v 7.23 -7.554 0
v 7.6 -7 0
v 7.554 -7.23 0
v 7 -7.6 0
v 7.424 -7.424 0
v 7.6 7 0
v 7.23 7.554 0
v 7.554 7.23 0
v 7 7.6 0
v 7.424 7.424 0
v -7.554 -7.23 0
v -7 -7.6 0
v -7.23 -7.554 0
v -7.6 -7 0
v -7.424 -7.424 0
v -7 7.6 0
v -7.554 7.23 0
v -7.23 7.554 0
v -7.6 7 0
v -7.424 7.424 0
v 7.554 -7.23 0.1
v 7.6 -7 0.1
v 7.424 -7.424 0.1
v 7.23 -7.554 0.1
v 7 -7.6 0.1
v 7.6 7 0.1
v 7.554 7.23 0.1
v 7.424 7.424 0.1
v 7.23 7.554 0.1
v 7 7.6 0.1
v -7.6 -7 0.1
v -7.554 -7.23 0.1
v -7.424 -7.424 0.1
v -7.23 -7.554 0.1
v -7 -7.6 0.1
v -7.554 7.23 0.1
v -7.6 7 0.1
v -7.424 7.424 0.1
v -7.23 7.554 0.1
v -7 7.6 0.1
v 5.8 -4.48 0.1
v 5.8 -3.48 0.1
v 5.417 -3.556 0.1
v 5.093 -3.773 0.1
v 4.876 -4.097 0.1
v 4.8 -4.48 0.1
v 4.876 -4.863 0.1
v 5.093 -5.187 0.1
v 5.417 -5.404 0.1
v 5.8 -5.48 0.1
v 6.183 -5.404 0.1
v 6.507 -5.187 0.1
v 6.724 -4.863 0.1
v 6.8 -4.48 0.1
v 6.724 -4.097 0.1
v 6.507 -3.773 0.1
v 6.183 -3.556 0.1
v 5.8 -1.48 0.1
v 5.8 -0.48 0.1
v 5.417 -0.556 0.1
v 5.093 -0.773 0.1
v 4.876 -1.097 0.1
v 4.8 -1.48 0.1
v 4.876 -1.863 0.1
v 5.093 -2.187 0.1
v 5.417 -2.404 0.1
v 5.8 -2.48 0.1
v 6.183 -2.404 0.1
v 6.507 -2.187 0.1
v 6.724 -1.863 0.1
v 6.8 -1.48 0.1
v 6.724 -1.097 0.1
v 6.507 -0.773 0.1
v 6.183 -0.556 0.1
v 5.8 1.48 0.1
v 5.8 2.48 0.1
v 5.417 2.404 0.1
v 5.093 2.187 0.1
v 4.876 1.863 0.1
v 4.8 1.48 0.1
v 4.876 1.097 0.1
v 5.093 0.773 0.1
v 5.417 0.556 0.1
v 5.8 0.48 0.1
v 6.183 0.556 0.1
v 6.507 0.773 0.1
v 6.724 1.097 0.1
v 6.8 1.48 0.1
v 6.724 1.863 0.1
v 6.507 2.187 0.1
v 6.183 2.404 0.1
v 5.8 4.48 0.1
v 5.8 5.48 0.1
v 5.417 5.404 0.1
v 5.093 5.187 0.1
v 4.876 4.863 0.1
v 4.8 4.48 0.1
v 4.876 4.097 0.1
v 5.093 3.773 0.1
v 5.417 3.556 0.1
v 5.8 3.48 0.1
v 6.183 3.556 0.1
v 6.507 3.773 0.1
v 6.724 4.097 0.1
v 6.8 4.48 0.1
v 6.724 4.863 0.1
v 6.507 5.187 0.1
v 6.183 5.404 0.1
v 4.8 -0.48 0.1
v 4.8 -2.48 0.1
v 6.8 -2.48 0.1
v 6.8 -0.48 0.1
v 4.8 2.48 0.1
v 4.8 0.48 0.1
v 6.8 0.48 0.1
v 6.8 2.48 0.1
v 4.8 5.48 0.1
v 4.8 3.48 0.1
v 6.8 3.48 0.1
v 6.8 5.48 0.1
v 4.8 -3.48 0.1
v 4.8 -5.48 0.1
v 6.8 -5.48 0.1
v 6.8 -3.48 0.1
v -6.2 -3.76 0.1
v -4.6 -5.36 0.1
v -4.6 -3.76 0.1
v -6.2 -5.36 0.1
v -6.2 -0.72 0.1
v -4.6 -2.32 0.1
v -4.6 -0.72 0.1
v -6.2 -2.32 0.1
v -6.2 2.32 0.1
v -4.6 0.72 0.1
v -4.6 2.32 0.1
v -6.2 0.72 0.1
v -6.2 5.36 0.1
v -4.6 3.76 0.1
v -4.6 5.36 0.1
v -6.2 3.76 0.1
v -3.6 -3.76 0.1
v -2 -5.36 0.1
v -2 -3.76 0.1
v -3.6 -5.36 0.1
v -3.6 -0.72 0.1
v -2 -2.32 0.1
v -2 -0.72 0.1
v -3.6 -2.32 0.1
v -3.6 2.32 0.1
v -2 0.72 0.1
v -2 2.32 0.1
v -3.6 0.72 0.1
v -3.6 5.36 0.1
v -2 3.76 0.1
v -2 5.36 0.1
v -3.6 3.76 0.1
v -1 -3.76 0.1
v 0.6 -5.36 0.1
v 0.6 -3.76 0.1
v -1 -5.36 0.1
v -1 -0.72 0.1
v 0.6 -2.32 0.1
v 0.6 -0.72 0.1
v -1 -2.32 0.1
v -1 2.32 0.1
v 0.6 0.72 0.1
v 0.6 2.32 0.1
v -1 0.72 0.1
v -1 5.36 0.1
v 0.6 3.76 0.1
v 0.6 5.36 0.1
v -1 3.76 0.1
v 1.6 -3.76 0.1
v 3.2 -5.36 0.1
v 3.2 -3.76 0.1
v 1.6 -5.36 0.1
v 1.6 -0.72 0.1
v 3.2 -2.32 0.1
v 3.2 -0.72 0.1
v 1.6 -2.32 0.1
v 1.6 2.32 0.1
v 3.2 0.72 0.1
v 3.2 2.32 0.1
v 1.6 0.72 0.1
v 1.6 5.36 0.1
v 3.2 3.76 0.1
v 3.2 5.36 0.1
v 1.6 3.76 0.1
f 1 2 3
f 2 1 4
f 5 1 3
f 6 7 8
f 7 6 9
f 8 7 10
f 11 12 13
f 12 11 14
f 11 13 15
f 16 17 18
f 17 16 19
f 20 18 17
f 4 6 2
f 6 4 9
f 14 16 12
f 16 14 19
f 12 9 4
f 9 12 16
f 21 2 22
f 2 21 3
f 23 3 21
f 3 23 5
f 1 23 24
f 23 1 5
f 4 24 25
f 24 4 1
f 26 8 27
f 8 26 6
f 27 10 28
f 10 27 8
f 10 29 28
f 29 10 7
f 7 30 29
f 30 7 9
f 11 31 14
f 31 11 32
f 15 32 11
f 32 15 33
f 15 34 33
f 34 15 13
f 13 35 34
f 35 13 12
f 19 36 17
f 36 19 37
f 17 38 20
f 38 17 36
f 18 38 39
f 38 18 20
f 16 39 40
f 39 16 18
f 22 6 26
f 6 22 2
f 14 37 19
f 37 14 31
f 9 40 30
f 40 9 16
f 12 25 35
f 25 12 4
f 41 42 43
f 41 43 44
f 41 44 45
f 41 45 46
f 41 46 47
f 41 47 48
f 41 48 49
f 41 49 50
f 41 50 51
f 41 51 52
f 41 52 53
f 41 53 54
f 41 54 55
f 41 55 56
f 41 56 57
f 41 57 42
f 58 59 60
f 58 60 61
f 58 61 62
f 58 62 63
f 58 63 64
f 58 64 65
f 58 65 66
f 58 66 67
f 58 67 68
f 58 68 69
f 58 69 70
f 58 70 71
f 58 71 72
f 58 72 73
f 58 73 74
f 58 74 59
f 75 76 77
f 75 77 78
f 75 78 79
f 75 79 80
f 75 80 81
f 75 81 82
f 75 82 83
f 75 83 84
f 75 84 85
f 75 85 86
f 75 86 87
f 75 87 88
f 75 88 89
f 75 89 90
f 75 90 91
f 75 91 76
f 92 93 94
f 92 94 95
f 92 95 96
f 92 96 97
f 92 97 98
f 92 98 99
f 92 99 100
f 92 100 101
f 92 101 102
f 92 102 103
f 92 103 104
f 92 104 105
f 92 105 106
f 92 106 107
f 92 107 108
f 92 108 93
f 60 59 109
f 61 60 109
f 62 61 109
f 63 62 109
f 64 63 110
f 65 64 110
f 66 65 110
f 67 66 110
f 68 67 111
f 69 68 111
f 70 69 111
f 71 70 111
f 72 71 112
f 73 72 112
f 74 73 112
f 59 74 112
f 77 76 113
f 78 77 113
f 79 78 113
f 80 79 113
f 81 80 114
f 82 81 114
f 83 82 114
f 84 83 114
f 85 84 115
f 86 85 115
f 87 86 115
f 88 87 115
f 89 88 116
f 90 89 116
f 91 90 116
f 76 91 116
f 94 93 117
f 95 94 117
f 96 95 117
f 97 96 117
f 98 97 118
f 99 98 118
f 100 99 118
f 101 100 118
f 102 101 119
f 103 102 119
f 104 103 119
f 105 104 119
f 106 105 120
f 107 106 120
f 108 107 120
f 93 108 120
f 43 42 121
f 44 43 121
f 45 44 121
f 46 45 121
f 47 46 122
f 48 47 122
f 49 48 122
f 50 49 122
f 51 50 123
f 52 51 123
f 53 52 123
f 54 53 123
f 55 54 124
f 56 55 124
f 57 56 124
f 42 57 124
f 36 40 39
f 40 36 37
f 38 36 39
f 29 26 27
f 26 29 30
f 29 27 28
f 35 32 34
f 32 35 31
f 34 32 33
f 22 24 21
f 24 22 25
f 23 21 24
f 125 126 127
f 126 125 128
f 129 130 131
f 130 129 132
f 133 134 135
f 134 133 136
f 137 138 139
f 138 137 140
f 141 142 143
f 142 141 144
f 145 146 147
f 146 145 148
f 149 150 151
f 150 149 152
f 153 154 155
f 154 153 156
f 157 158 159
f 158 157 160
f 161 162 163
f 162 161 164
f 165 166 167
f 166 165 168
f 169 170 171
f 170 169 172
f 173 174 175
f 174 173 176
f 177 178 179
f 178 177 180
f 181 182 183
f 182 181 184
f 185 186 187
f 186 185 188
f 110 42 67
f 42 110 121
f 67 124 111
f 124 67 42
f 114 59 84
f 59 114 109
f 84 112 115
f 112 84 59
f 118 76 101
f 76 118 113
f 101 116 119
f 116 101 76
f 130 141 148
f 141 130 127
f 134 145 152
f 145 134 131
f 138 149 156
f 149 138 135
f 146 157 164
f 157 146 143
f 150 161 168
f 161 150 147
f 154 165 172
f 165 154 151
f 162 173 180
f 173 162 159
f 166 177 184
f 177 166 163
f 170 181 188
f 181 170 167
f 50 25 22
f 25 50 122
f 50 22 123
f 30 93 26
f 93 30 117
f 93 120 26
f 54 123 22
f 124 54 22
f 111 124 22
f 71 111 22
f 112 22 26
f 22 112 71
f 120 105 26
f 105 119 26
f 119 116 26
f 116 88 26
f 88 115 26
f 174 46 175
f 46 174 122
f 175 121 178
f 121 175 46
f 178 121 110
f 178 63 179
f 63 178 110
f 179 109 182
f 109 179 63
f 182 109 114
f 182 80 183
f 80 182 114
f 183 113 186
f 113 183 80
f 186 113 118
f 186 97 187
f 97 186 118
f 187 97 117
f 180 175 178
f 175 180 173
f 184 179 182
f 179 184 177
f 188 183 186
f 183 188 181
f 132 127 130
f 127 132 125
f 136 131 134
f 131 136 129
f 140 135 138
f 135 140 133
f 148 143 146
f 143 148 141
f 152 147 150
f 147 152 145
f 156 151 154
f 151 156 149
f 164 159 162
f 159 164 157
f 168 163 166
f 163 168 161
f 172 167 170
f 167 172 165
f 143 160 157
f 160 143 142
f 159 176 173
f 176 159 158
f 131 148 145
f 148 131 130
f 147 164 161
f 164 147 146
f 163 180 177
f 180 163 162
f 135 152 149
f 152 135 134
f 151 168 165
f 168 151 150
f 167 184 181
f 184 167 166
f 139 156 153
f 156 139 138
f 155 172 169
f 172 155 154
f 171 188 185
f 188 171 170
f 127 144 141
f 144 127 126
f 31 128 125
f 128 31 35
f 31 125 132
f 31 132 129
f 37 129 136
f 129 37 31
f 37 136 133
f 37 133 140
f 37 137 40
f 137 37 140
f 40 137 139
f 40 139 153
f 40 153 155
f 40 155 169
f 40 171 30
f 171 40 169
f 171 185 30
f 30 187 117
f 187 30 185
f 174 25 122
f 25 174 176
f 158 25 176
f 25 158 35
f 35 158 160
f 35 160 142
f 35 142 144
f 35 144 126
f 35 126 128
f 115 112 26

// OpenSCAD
// file: ../p/4-4ndis.scad
use <../lib.scad>
function ldraw_lib__4_4ndis() = [
// 0 Disc Negative 1.0
// 0 Name: 4-4ndis.dat
// 0 Author: James Jessiman
// 0 !LDRAW_ORG Primitive UPDATE 2012-01
// 0 !LICENSE Licensed under CC BY 4.0 : see CAreadme.txt
// 
// 0 BFC CERTIFY CCW
  [0,"BFC","CERTIFY"],
  [0,"BFC","CCW"],
// 
// 0 !HISTORY 2002-03-23 [sbliss] Added BFC statement; compacted code
// 0 !HISTORY 2002-04-25 [PTadmin] Official Update 2002-02
// 0 !HISTORY 2007-06-24 [PTadmin] Header formatted for Contributor Agreement
// 0 !HISTORY 2008-07-01 [PTadmin] Official Update 2008-01
// 0 !HISTORY 2012-02-16 [Philo] Changed to CCW
// 0 !HISTORY 2012-03-30 [PTadmin] Official Update 2012-01
// 
// 
// 3 16 0.9239 0 0.3827 1 0 0 1 0 1
  [3,16,0.9239,0,0.3827,1,0,0,1,0,1],
// 3 16 0.7071 0 0.7071 0.9239 0 0.3827 1 0 1
  [3,16,0.7071,0,0.7071,0.9239,0,0.3827,1,0,1],
// 3 16 0.3827 0 0.9239 0.7071 0 0.7071 1 0 1
  [3,16,0.3827,0,0.9239,0.7071,0,0.7071,1,0,1],
// 3 16 0 0 1 0.3827 0 0.9239 1 0 1
  [3,16,0,0,1,0.3827,0,0.9239,1,0,1],
// 3 16 -0.3827 0 0.9239 0 0 1 -1 0 1
  [3,16,-0.3827,0,0.9239,0,0,1,-1,0,1],
// 3 16 -0.7071 0 0.7071 -0.3827 0 0.9239 -1 0 1
  [3,16,-0.7071,0,0.7071,-0.3827,0,0.9239,-1,0,1],
// 3 16 -0.9239 0 0.3827 -0.7071 0 0.7071 -1 0 1
  [3,16,-0.9239,0,0.3827,-0.7071,0,0.7071,-1,0,1],
// 3 16 -1 0 0 -0.9239 0 0.3827 -1 0 1
  [3,16,-1,0,0,-0.9239,0,0.3827,-1,0,1],
// 3 16 -0.9239 0 -0.3827 -1 0 0 -1 0 -1
  [3,16,-0.9239,0,-0.3827,-1,0,0,-1,0,-1],
// 3 16 -0.7071 0 -0.7071 -0.9239 0 -0.3827 -1 0 -1
  [3,16,-0.7071,0,-0.7071,-0.9239,0,-0.3827,-1,0,-1],
// 3 16 -0.3827 0 -0.9239 -0.7071 0 -0.7071 -1 0 -1
  [3,16,-0.3827,0,-0.9239,-0.7071,0,-0.7071,-1,0,-1],
// 3 16 0 0 -1 -0.3827 0 -0.9239 -1 0 -1
  [3,16,0,0,-1,-0.3827,0,-0.9239,-1,0,-1],
// 3 16 0.3827 0 -0.9239 0 0 -1 1 0 -1
  [3,16,0.3827,0,-0.9239,0,0,-1,1,0,-1],
// 3 16 0.7071 0 -0.7071 0.3827 0 -0.9239 1 0 -1
  [3,16,0.7071,0,-0.7071,0.3827,0,-0.9239,1,0,-1],
// 3 16 0.9239 0 -0.3827 0.7071 0 -0.7071 1 0 -1
  [3,16,0.9239,0,-0.3827,0.7071,0,-0.7071,1,0,-1],
// 3 16 1 0 0 0.9239 0 -0.3827 1 0 -1
  [3,16,1,0,0,0.9239,0,-0.3827,1,0,-1],
];
module ldraw_lib__4_4ndis(step=0, col=false, unit=2/5, alt=false, line=0.2, solid=!$preview)
    makepoly(ldraw_lib__4_4ndis(), step=step, col=col, unit=unit, alt=alt, line=line, solid=solid);
ldraw_lib__4_4ndis(line=0.2);
// file: ../p/4-4disc.scad
use <../lib.scad>
function ldraw_lib__4_4disc() = [
// 0 Disc 1.0
// 0 Name: 4-4disc.dat
// 0 Author: James Jessiman
// 0 !LDRAW_ORG Primitive UPDATE 2002-02
// 0 !LICENSE Licensed under CC BY 4.0 : see CAreadme.txt
// 
// 0 BFC CERTIFY CCW
  [0,"BFC","CERTIFY"],
  [0,"BFC","CCW"],
// 
// 0 !HISTORY 1998-12-15 [PTadmin] Official Update 1998-10
// 0 !HISTORY 2002-03-23 [sbliss] Added BFC statement
// 0 !HISTORY 2002-04-25 [PTadmin] Official Update 2002-02
// 0 !HISTORY 2007-06-24 [PTadmin] Header formatted for Contributor Agreement
// 0 !HISTORY 2008-07-01 [PTadmin] Official Update 2008-01
// 
// 
// 3 16 0 0 0 1 0 0 0.9239 0 0.3827
  [3,16,0,0,0,1,0,0,0.9239,0,0.3827],
// 3 16 0 0 0 0.9239 0 0.3827 0.7071 0 0.7071
  [3,16,0,0,0,0.9239,0,0.3827,0.7071,0,0.7071],
// 3 16 0 0 0 0.7071 0 0.7071 0.3827 0 0.9239
  [3,16,0,0,0,0.7071,0,0.7071,0.3827,0,0.9239],
// 3 16 0 0 0 0.3827 0 0.9239 0 0 1
  [3,16,0,0,0,0.3827,0,0.9239,0,0,1],
// 3 16 0 0 0 0 0 1 -0.3827 0 0.9239
  [3,16,0,0,0,0,0,1,-0.3827,0,0.9239],
// 3 16 0 0 0 -0.3827 0 0.9239 -0.7071 0 0.7071
  [3,16,0,0,0,-0.3827,0,0.9239,-0.7071,0,0.7071],
// 3 16 0 0 0 -0.7071 0 0.7071 -0.9239 0 0.3827
  [3,16,0,0,0,-0.7071,0,0.7071,-0.9239,0,0.3827],
// 3 16 0 0 0 -0.9239 0 0.3827 -1 0 -0
  [3,16,0,0,0,-0.9239,0,0.3827,-1,0,-0],
// 3 16 0 0 0 -1 0 -0 -0.9239 0 -0.3827
  [3,16,0,0,0,-1,0,-0,-0.9239,0,-0.3827],
// 3 16 0 0 0 -0.9239 0 -0.3827 -0.7071 0 -0.7071
  [3,16,0,0,0,-0.9239,0,-0.3827,-0.7071,0,-0.7071],
// 3 16 0 0 0 -0.7071 0 -0.7071 -0.3827 0 -0.9239
  [3,16,0,0,0,-0.7071,0,-0.7071,-0.3827,0,-0.9239],
// 3 16 0 0 0 -0.3827 0 -0.9239 0 0 -1
  [3,16,0,0,0,-0.3827,0,-0.9239,0,0,-1],
// 3 16 0 0 0 0 0 -1 0.3827 0 -0.9239
  [3,16,0,0,0,0,0,-1,0.3827,0,-0.9239],
// 3 16 0 0 0 0.3827 0 -0.9239 0.7071 0 -0.7071
  [3,16,0,0,0,0.3827,0,-0.9239,0.7071,0,-0.7071],
// 3 16 0 0 0 0.7071 0 -0.7071 0.9239 0 -0.3827
  [3,16,0,0,0,0.7071,0,-0.7071,0.9239,0,-0.3827],
// 3 16 0 0 0 0.9239 0 -0.3827 1 0 0
  [3,16,0,0,0,0.9239,0,-0.3827,1,0,0],
// 0
];
module ldraw_lib__4_4disc(step=0, col=false, unit=2/5, alt=false, line=0.2, solid=!$preview)
    makepoly(ldraw_lib__4_4disc(), step=step, col=col, unit=unit, alt=alt, line=line, solid=solid);
ldraw_lib__4_4disc(line=0.2);
// file: ../p/1-4cyli.scad
use <../lib.scad>
function ldraw_lib__1_4cyli() = [
// 0 Cylinder 0.25
// 0 Name: 1-4cyli.dat
// 0 Author: James Jessiman
// 0 !LDRAW_ORG Primitive UPDATE 2012-01
// 0 !LICENSE Licensed under CC BY 4.0 : see CAreadme.txt
// 
// 0 BFC CERTIFY CCW
  [0,"BFC","CERTIFY"],
  [0,"BFC","CCW"],
// 
// 0 !HISTORY 2002-03-23 [sbliss] Added BFC statement.
// 0 !HISTORY 2002-04-25 [PTadmin] Official Update 2002-02
// 0 !HISTORY 2007-06-22 [PTadmin] Header formatted for Contributor Agreement
// 0 !HISTORY 2008-07-01 [PTadmin] Official Update 2008-01
// 0 !HISTORY 2012-02-16 [Philo] Changed to CCW
// 0 !HISTORY 2012-03-30 [PTadmin] Official Update 2012-01
// 
// 
// 4 16 1 1 0 0.9239 1 0.3827 0.9239 0 0.3827 1 0 0
  [4,16,1,1,0,0.9239,1,0.3827,0.9239,0,0.3827,1,0,0],
// 5 24 1 0 0 1 1 0 0.9239 0 0.3827 1 0 -1
  [5,24,1,0,0,1,1,0,0.9239,0,0.3827,1,0,-1],
// 4 16 0.9239 1 0.3827 0.7071 1 0.7071 0.7071 0 0.7071 0.9239 0 0.3827
  [4,16,0.9239,1,0.3827,0.7071,1,0.7071,0.7071,0,0.7071,0.9239,0,0.3827],
// 5 24 0.9239 0 0.3827 0.9239 1 0.3827 0.7071 0 0.7071 1 0 0
  [5,24,0.9239,0,0.3827,0.9239,1,0.3827,0.7071,0,0.7071,1,0,0],
// 4 16 0.7071 1 0.7071 0.3827 1 0.9239 0.3827 0 0.9239 0.7071 0 0.7071
  [4,16,0.7071,1,0.7071,0.3827,1,0.9239,0.3827,0,0.9239,0.7071,0,0.7071],
// 5 24 0.7071 0 0.7071 0.7071 1 0.7071 0.3827 0 0.9239 0.9239 0 0.3827
  [5,24,0.7071,0,0.7071,0.7071,1,0.7071,0.3827,0,0.9239,0.9239,0,0.3827],
// 4 16 0.3827 1 0.9239 0 1 1 0 0 1 0.3827 0 0.9239
  [4,16,0.3827,1,0.9239,0,1,1,0,0,1,0.3827,0,0.9239],
// 5 24 0.3827 0 0.9239 0.3827 1 0.9239 0 0 1 0.7071 0 0.7071
  [5,24,0.3827,0,0.9239,0.3827,1,0.9239,0,0,1,0.7071,0,0.7071],
// 5 24 0 0 1 0 1 1 0.3827 0 0.9239 -1 0 1
  [5,24,0,0,1,0,1,1,0.3827,0,0.9239,-1,0,1],
];
module ldraw_lib__1_4cyli(step=0, col=false, unit=2/5, alt=false, line=0.2, solid=!$preview)
    makepoly(ldraw_lib__1_4cyli(), step=step, col=col, unit=unit, alt=alt, line=line, solid=solid);
ldraw_lib__1_4cyli(line=0.2);
// file: ../p/1-4chrd.scad
use <../lib.scad>
function ldraw_lib__1_4chrd() = [
// 0 Chord 0.25
// 0 Name: 1-4chrd.dat
// 0 Author: Max Martin Richter [MMR1988]
// 0 !LDRAW_ORG Primitive UPDATE 2023-05
// 0 !LICENSE Licensed under CC BY 4.0 : see CAreadme.txt
// 
// 0 BFC CERTIFY CCW
  [0,"BFC","CERTIFY"],
  [0,"BFC","CCW"],
// 
// 0 !HISTORY 2004-04-22 [PTadmin] Official Update 2004-02
// 0 !HISTORY 2007-10-09 [PTadmin] Header formatted for Contributor Agreement
// 0 !HISTORY 2008-07-01 [PTadmin] Official Update 2008-01
// 0 !HISTORY 2012-08-02 [MMR1988] Re-creation with PrimGen2 and Rectifier
// 0 !HISTORY 2012-08-09 [PTadmin] Official Update 2012-02
// 0 !HISTORY 2023-10-27 [OrionP] Change author to MMR1988 from hafhead
// 0 !HISTORY 2023-10-31 [OrionP] Official Update 2023-05
// 
// 4 16 0.9239 0 0.3827 0.3827 0 0.9239 0 0 1 1 0 0
  [4,16,0.9239,0,0.3827,0.3827,0,0.9239,0,0,1,1,0,0],
// 3 16 0.7071 0 0.7071 0.3827 0 0.9239 0.9239 0 0.3827
  [3,16,0.7071,0,0.7071,0.3827,0,0.9239,0.9239,0,0.3827],
];
module ldraw_lib__1_4chrd(step=0, col=false, unit=2/5, alt=false, line=0.2, solid=!$preview)
    makepoly(ldraw_lib__1_4chrd(), step=step, col=col, unit=unit, alt=alt, line=line, solid=solid);
ldraw_lib__1_4chrd(line=0.2);
// main file
use <../lib.scad>
use <../p/1-4chrd.scad>
use <../p/1-4cyli.scad>
use <../p/4-4disc.scad>
use <../p/4-4ndis.scad>
function ldraw_lib__6429457f() = [
// 0 Sticker  1.9 x  1.9 with Red Circles and Black Rectangles on Yellow Background
// 0 Name: 6429457f.dat
// 0 Author: Gabriel Läufer [Dr.Bricktacular]
// 0 !LDRAW_ORG Part UPDATE 2025-02
// 0 !LICENSE Licensed under CC BY 4.0 : see CAreadme.txt
// 
// 0 BFC CERTIFY CCW
  [0,"BFC","CERTIFY"],
  [0,"BFC","CCW"],
// 
// 0 !KEYWORDS Blacktron Cruiser, Blacktron I, Bricklink 40580stk01
// 0 !KEYWORDS Brickowl 402277, control panel, Rebrickable 10102362, Set 40580
// 
// 0 !HISTORY 2025-02-27 [OrionP] Official Update 2025-02
// 
// 0 // Sticker-Bottom
// 1 16 17.5 0 -17.5 1.5 0 0 0 -1 0 0 0 -1.5 1-4chrd.dat
  [1,16,17.5,0,-17.5,1.5,0,0,0,-1,0,0,0,-1.5, ldraw_lib__1_4chrd()],
// 1 16 17.5 0 17.5 1.5 0 0 0 -1 0 0 0 1.5 1-4chrd.dat
  [1,16,17.5,0,17.5,1.5,0,0,0,-1,0,0,0,1.5, ldraw_lib__1_4chrd()],
// 1 16 -17.5 0 -17.5 -1.5 0 0 0 -1 0 0 0 -1.5 1-4chrd.dat
  [1,16,-17.5,0,-17.5,-1.5,0,0,0,-1,0,0,0,-1.5, ldraw_lib__1_4chrd()],
// 1 16 -17.5 0 17.5 -1.5 0 0 0 -1 0 0 0 1.5 1-4chrd.dat
  [1,16,-17.5,0,17.5,-1.5,0,0,0,-1,0,0,0,1.5, ldraw_lib__1_4chrd()],
// 4 16 19 0 17.5 19 0 -17.5 17.5 0 -19 17.5 0 19
  [4,16,19,0,17.5,19,0,-17.5,17.5,0,-19,17.5,0,19],
// 4 16 -19 0 17.5 -17.5 0 19 -17.5 0 -19 -19 0 -17.5
  [4,16,-19,0,17.5,-17.5,0,19,-17.5,0,-19,-19,0,-17.5],
// 4 16 17.5 0 19 17.5 0 -19 -17.5 0 -19 -17.5 0 19
  [4,16,17.5,0,19,17.5,0,-19,-17.5,0,-19,-17.5,0,19],
// 
// 0 // Sticker-Side
// 1 16 17.5 -.25 -17.5 1.5 0 0 0 .25 0 0 0 -1.5 1-4cyli.dat
  [1,16,17.5,-.25,-17.5,1.5,0,0,0,.25,0,0,0,-1.5, ldraw_lib__1_4cyli()],
// 1 16 17.5 -.25 17.5 1.5 0 0 0 .25 0 0 0 1.5 1-4cyli.dat
  [1,16,17.5,-.25,17.5,1.5,0,0,0,.25,0,0,0,1.5, ldraw_lib__1_4cyli()],
// 1 16 -17.5 -.25 -17.5 -1.5 0 0 0 .25 0 0 0 -1.5 1-4cyli.dat
  [1,16,-17.5,-.25,-17.5,-1.5,0,0,0,.25,0,0,0,-1.5, ldraw_lib__1_4cyli()],
// 1 16 -17.5 -.25 17.5 -1.5 0 0 0 .25 0 0 0 1.5 1-4cyli.dat
  [1,16,-17.5,-.25,17.5,-1.5,0,0,0,.25,0,0,0,1.5, ldraw_lib__1_4cyli()],
// 4 16 19 0 17.5 19 -.25 17.5 19 -.25 -17.5 19 0 -17.5
  [4,16,19,0,17.5,19,-.25,17.5,19,-.25,-17.5,19,0,-17.5],
// 4 16 -19 0 17.5 -19 0 -17.5 -19 -.25 -17.5 -19 -.25 17.5
  [4,16,-19,0,17.5,-19,0,-17.5,-19,-.25,-17.5,-19,-.25,17.5],
// 4 16 -17.5 0 19 -17.5 -.25 19 17.5 -.25 19 17.5 0 19
  [4,16,-17.5,0,19,-17.5,-.25,19,17.5,-.25,19,17.5,0,19],
// 4 16 -17.5 0 -19 17.5 0 -19 17.5 -.25 -19 -17.5 -.25 -19
  [4,16,-17.5,0,-19,17.5,0,-19,17.5,-.25,-19,-17.5,-.25,-19],
// 
// 0 // Sticker-Front
// 1 4 14.5 -.25 -11.2 0 0 -2.5 0 1 0 2.5 0 0 4-4disc.dat
  [1,4,14.5,-.25,-11.2,0,0,-2.5,0,1,0,2.5,0,0, ldraw_lib__4_4disc()],
// 1 4 14.5 -.25 -3.7 0 0 -2.5 0 1 0 2.5 0 0 4-4disc.dat
  [1,4,14.5,-.25,-3.7,0,0,-2.5,0,1,0,2.5,0,0, ldraw_lib__4_4disc()],
// 1 4 14.5 -.25 3.7 0 0 -2.5 0 1 0 2.5 0 0 4-4disc.dat
  [1,4,14.5,-.25,3.7,0,0,-2.5,0,1,0,2.5,0,0, ldraw_lib__4_4disc()],
// 1 4 14.5 -.25 11.2 0 0 -2.5 0 1 0 2.5 0 0 4-4disc.dat
  [1,4,14.5,-.25,11.2,0,0,-2.5,0,1,0,2.5,0,0, ldraw_lib__4_4disc()],
// 1 14 14.5 -.25 -3.7 0 0 -2.5 0 1 0 2.5 0 0 4-4ndis.dat
  [1,14,14.5,-.25,-3.7,0,0,-2.5,0,1,0,2.5,0,0, ldraw_lib__4_4ndis()],
// 1 14 14.5 -.25 3.7 0 0 -2.5 0 1 0 2.5 0 0 4-4ndis.dat
  [1,14,14.5,-.25,3.7,0,0,-2.5,0,1,0,2.5,0,0, ldraw_lib__4_4ndis()],
// 1 14 14.5 -.25 11.2 0 0 -2.5 0 1 0 2.5 0 0 4-4ndis.dat
  [1,14,14.5,-.25,11.2,0,0,-2.5,0,1,0,2.5,0,0, ldraw_lib__4_4ndis()],
// 1 14 14.5 -.25 -11.2 0 0 -2.5 0 1 0 2.5 0 0 4-4ndis.dat
  [1,14,14.5,-.25,-11.2,0,0,-2.5,0,1,0,2.5,0,0, ldraw_lib__4_4ndis()],
// 1 14 -17.5 -.25 17.5 0 0 -1.5 0 1 0 1.5 0 0 1-4chrd.dat
  [1,14,-17.5,-.25,17.5,0,0,-1.5,0,1,0,1.5,0,0, ldraw_lib__1_4chrd()],
// 1 14 17.5 -.25 17.5 0 0 1.5 0 1 0 1.5 0 0 1-4chrd.dat
  [1,14,17.5,-.25,17.5,0,0,1.5,0,1,0,1.5,0,0, ldraw_lib__1_4chrd()],
// 1 14 -17.5 -.25 -17.5 0 0 -1.5 0 1 0 -1.5 0 0 1-4chrd.dat
  [1,14,-17.5,-.25,-17.5,0,0,-1.5,0,1,0,-1.5,0,0, ldraw_lib__1_4chrd()],
// 1 14 17.5 -.25 -17.5 0 0 1.5 0 1 0 -1.5 0 0 1-4chrd.dat
  [1,14,17.5,-.25,-17.5,0,0,1.5,0,1,0,-1.5,0,0, ldraw_lib__1_4chrd()],
// 4 0 -15.5 -.25 -13.4 -11.5 -.25 -13.4 -11.5 -.25 -9.4 -15.5 -.25 -9.4
  [4,0,-15.5,-.25,-13.4,-11.5,-.25,-13.4,-11.5,-.25,-9.4,-15.5,-.25,-9.4],
// 4 0 -15.5 -.25 -5.8 -11.5 -.25 -5.8 -11.5 -.25 -1.8 -15.5 -.25 -1.8
  [4,0,-15.5,-.25,-5.8,-11.5,-.25,-5.8,-11.5,-.25,-1.8,-15.5,-.25,-1.8],
// 4 0 -15.5 -.25 1.8 -11.5 -.25 1.8 -11.5 -.25 5.8 -15.5 -.25 5.8
  [4,0,-15.5,-.25,1.8,-11.5,-.25,1.8,-11.5,-.25,5.8,-15.5,-.25,5.8],
// 4 0 -15.5 -.25 9.4 -11.5 -.25 9.4 -11.5 -.25 13.4 -15.5 -.25 13.4
  [4,0,-15.5,-.25,9.4,-11.5,-.25,9.4,-11.5,-.25,13.4,-15.5,-.25,13.4],
// 4 0 -9 -.25 -13.4 -5 -.25 -13.4 -5 -.25 -9.4 -9 -.25 -9.4
  [4,0,-9,-.25,-13.4,-5,-.25,-13.4,-5,-.25,-9.4,-9,-.25,-9.4],
// 4 0 -9 -.25 -5.8 -5 -.25 -5.8 -5 -.25 -1.8 -9 -.25 -1.8
  [4,0,-9,-.25,-5.8,-5,-.25,-5.8,-5,-.25,-1.8,-9,-.25,-1.8],
// 4 0 -9 -.25 1.8 -5 -.25 1.8 -5 -.25 5.8 -9 -.25 5.8
  [4,0,-9,-.25,1.8,-5,-.25,1.8,-5,-.25,5.8,-9,-.25,5.8],
// 4 0 -9 -.25 9.4 -5 -.25 9.4 -5 -.25 13.4 -9 -.25 13.4
  [4,0,-9,-.25,9.4,-5,-.25,9.4,-5,-.25,13.4,-9,-.25,13.4],
// 4 0 -2.5 -.25 -13.4 1.5 -.25 -13.4 1.5 -.25 -9.4 -2.5 -.25 -9.4
  [4,0,-2.5,-.25,-13.4,1.5,-.25,-13.4,1.5,-.25,-9.4,-2.5,-.25,-9.4],
// 4 0 -2.5 -.25 -5.8 1.5 -.25 -5.8 1.5 -.25 -1.8 -2.5 -.25 -1.8
  [4,0,-2.5,-.25,-5.8,1.5,-.25,-5.8,1.5,-.25,-1.8,-2.5,-.25,-1.8],
// 4 0 -2.5 -.25 1.8 1.5 -.25 1.8 1.5 -.25 5.8 -2.5 -.25 5.8
  [4,0,-2.5,-.25,1.8,1.5,-.25,1.8,1.5,-.25,5.8,-2.5,-.25,5.8],
// 4 0 -2.5 -.25 9.4 1.5 -.25 9.4 1.5 -.25 13.4 -2.5 -.25 13.4
  [4,0,-2.5,-.25,9.4,1.5,-.25,9.4,1.5,-.25,13.4,-2.5,-.25,13.4],
// 4 0 4 -.25 -13.4 8 -.25 -13.4 8 -.25 -9.4 4 -.25 -9.4
  [4,0,4,-.25,-13.4,8,-.25,-13.4,8,-.25,-9.4,4,-.25,-9.4],
// 4 0 4 -.25 -5.8 8 -.25 -5.8 8 -.25 -1.8 4 -.25 -1.8
  [4,0,4,-.25,-5.8,8,-.25,-5.8,8,-.25,-1.8,4,-.25,-1.8],
// 4 0 4 -.25 1.8 8 -.25 1.8 8 -.25 5.8 4 -.25 5.8
  [4,0,4,-.25,1.8,8,-.25,1.8,8,-.25,5.8,4,-.25,5.8],
// 4 0 4 -.25 9.4 8 -.25 9.4 8 -.25 13.4 4 -.25 13.4
  [4,0,4,-.25,9.4,8,-.25,9.4,8,-.25,13.4,4,-.25,13.4],
// 4 14 12 -.25 -6.2 12 -.25 -8.7 14.5 -.25 -8.7 14.5 -.25 -6.2
  [4,14,12,-.25,-6.2,12,-.25,-8.7,14.5,-.25,-8.7,14.5,-.25,-6.2],
// 4 14 14.5 -.25 -6.2 14.5 -.25 -8.7 17 -.25 -8.7 17 -.25 -6.2
  [4,14,14.5,-.25,-6.2,14.5,-.25,-8.7,17,-.25,-8.7,17,-.25,-6.2],
// 4 14 12 -.25 1.2 12 -.25 -1.2 14.5 -.25 -1.2 14.5 -.25 1.2
  [4,14,12,-.25,1.2,12,-.25,-1.2,14.5,-.25,-1.2,14.5,-.25,1.2],
// 4 14 14.5 -.25 1.2 14.5 -.25 -1.2 17 -.25 -1.2 17 -.25 1.2
  [4,14,14.5,-.25,1.2,14.5,-.25,-1.2,17,-.25,-1.2,17,-.25,1.2],
// 4 14 12 -.25 8.7 12 -.25 6.2 14.5 -.25 6.2 14.5 -.25 8.7
  [4,14,12,-.25,8.7,12,-.25,6.2,14.5,-.25,6.2,14.5,-.25,8.7],
// 4 14 14.5 -.25 8.7 14.5 -.25 6.2 17 -.25 6.2 17 -.25 8.7
  [4,14,14.5,-.25,8.7,14.5,-.25,6.2,17,-.25,6.2,17,-.25,8.7],
// 4 14 -11.5 -.25 -5.8 -11.5 -.25 -9.4 -9 -.25 -9.4 -9 -.25 -5.8
  [4,14,-11.5,-.25,-5.8,-11.5,-.25,-9.4,-9,-.25,-9.4,-9,-.25,-5.8],
// 4 14 -11.5 -.25 1.8 -11.5 -.25 -1.8 -9 -.25 -1.8 -9 -.25 1.8
  [4,14,-11.5,-.25,1.8,-11.5,-.25,-1.8,-9,-.25,-1.8,-9,-.25,1.8],
// 4 14 -11.5 -.25 9.4 -11.5 -.25 5.8 -9 -.25 5.8 -9 -.25 9.4
  [4,14,-11.5,-.25,9.4,-11.5,-.25,5.8,-9,-.25,5.8,-9,-.25,9.4],
// 4 14 -5 -.25 -5.8 -5 -.25 -9.4 -2.5 -.25 -9.4 -2.5 -.25 -5.8
  [4,14,-5,-.25,-5.8,-5,-.25,-9.4,-2.5,-.25,-9.4,-2.5,-.25,-5.8],
// 4 14 -5 -.25 1.8 -5 -.25 -1.8 -2.5 -.25 -1.8 -2.5 -.25 1.8
  [4,14,-5,-.25,1.8,-5,-.25,-1.8,-2.5,-.25,-1.8,-2.5,-.25,1.8],
// 4 14 -5 -.25 9.4 -5 -.25 5.8 -2.5 -.25 5.8 -2.5 -.25 9.4
  [4,14,-5,-.25,9.4,-5,-.25,5.8,-2.5,-.25,5.8,-2.5,-.25,9.4],
// 4 14 1.5 -.25 -5.8 1.5 -.25 -9.4 4 -.25 -9.4 4 -.25 -5.8
  [4,14,1.5,-.25,-5.8,1.5,-.25,-9.4,4,-.25,-9.4,4,-.25,-5.8],
// 4 14 1.5 -.25 1.8 1.5 -.25 -1.8 4 -.25 -1.8 4 -.25 1.8
  [4,14,1.5,-.25,1.8,1.5,-.25,-1.8,4,-.25,-1.8,4,-.25,1.8],
// 4 14 1.5 -.25 9.4 1.5 -.25 5.8 4 -.25 5.8 4 -.25 9.4
  [4,14,1.5,-.25,9.4,1.5,-.25,5.8,4,-.25,5.8,4,-.25,9.4],
// 4 14 12 -.25 -13.7 17.5 -.25 -19 19 -.25 -17.5 14.5 -.25 -13.7
  [4,14,12,-.25,-13.7,17.5,-.25,-19,19,-.25,-17.5,14.5,-.25,-13.7],
// 3 14 14.5 -.25 -13.7 19 -.25 -17.5 17 -.25 -13.7
  [3,14,14.5,-.25,-13.7,19,-.25,-17.5,17,-.25,-13.7],
// 4 14 19 -.25 17.5 17.5 -.25 19 12 -.25 13.7 14.5 -.25 13.7
  [4,14,19,-.25,17.5,17.5,-.25,19,12,-.25,13.7,14.5,-.25,13.7],
// 3 14 14.5 -.25 13.7 17 -.25 13.7 19 -.25 17.5
  [3,14,14.5,-.25,13.7,17,-.25,13.7,19,-.25,17.5],
// 3 14 17 -.25 -11.2 17 -.25 -13.7 19 -.25 -17.5
  [3,14,17,-.25,-11.2,17,-.25,-13.7,19,-.25,-17.5],
// 3 14 17 -.25 -8.7 17 -.25 -11.2 19 -.25 -17.5
  [3,14,17,-.25,-8.7,17,-.25,-11.2,19,-.25,-17.5],
// 3 14 17 -.25 -6.2 17 -.25 -8.7 19 -.25 -17.5
  [3,14,17,-.25,-6.2,17,-.25,-8.7,19,-.25,-17.5],
// 3 14 17 -.25 -3.7 17 -.25 -6.2 19 -.25 -17.5
  [3,14,17,-.25,-3.7,17,-.25,-6.2,19,-.25,-17.5],
// 4 14 17 -.25 -1.2 17 -.25 -3.7 19 -.25 -17.5 19 -.25 17.5
  [4,14,17,-.25,-1.2,17,-.25,-3.7,19,-.25,-17.5,19,-.25,17.5],
// 3 14 17 -.25 13.7 17 -.25 11.2 19 -.25 17.5
  [3,14,17,-.25,13.7,17,-.25,11.2,19,-.25,17.5],
// 3 14 17 -.25 11.2 17 -.25 8.7 19 -.25 17.5
  [3,14,17,-.25,11.2,17,-.25,8.7,19,-.25,17.5],
// 3 14 17 -.25 8.7 17 -.25 6.2 19 -.25 17.5
  [3,14,17,-.25,8.7,17,-.25,6.2,19,-.25,17.5],
// 3 14 17 -.25 6.2 17 -.25 3.7 19 -.25 17.5
  [3,14,17,-.25,6.2,17,-.25,3.7,19,-.25,17.5],
// 3 14 17 -.25 3.7 17 -.25 1.2 19 -.25 17.5
  [3,14,17,-.25,3.7,17,-.25,1.2,19,-.25,17.5],
// 4 14 8 -.25 -9.4 8 -.25 -13.4 12 -.25 -13.7 12 -.25 -11.2
  [4,14,8,-.25,-9.4,8,-.25,-13.4,12,-.25,-13.7,12,-.25,-11.2],
// 4 14 8 -.25 -9.4 12 -.25 -11.2 12 -.25 -8.7 8 -.25 -5.8
  [4,14,8,-.25,-9.4,12,-.25,-11.2,12,-.25,-8.7,8,-.25,-5.8],
// 3 14 8 -.25 -5.8 12 -.25 -8.7 12 -.25 -6.2
  [3,14,8,-.25,-5.8,12,-.25,-8.7,12,-.25,-6.2],
// 4 14 8 -.25 -5.8 12 -.25 -6.2 12 -.25 -3.7 8 -.25 -1.8
  [4,14,8,-.25,-5.8,12,-.25,-6.2,12,-.25,-3.7,8,-.25,-1.8],
// 4 14 8 -.25 -1.8 12 -.25 -3.7 12 -.25 -1.2 8 -.25 1.8
  [4,14,8,-.25,-1.8,12,-.25,-3.7,12,-.25,-1.2,8,-.25,1.8],
// 3 14 8 -.25 1.8 12 -.25 -1.2 12 -.25 1.2
  [3,14,8,-.25,1.8,12,-.25,-1.2,12,-.25,1.2],
// 4 14 8 -.25 1.8 12 -.25 1.2 12 -.25 3.7 8 -.25 5.8
  [4,14,8,-.25,1.8,12,-.25,1.2,12,-.25,3.7,8,-.25,5.8],
// 4 14 8 -.25 5.8 12 -.25 3.7 12 -.25 6.2 8 -.25 9.4
  [4,14,8,-.25,5.8,12,-.25,3.7,12,-.25,6.2,8,-.25,9.4],
// 3 14 8 -.25 9.4 12 -.25 6.2 12 -.25 8.7
  [3,14,8,-.25,9.4,12,-.25,6.2,12,-.25,8.7],
// 4 14 8 -.25 9.4 12 -.25 8.7 12 -.25 11.2 8 -.25 13.4
  [4,14,8,-.25,9.4,12,-.25,8.7,12,-.25,11.2,8,-.25,13.4],
// 3 14 8 -.25 13.4 12 -.25 11.2 12 -.25 13.7
  [3,14,8,-.25,13.4,12,-.25,11.2,12,-.25,13.7],
// 4 14 4 -.25 -5.8 4 -.25 -9.4 8 -.25 -9.4 8 -.25 -5.8
  [4,14,4,-.25,-5.8,4,-.25,-9.4,8,-.25,-9.4,8,-.25,-5.8],
// 4 14 4 -.25 1.8 4 -.25 -1.8 8 -.25 -1.8 8 -.25 1.8
  [4,14,4,-.25,1.8,4,-.25,-1.8,8,-.25,-1.8,8,-.25,1.8],
// 4 14 4 -.25 9.4 4 -.25 5.8 8 -.25 5.8 8 -.25 9.4
  [4,14,4,-.25,9.4,4,-.25,5.8,8,-.25,5.8,8,-.25,9.4],
// 4 14 -15.5 -.25 -5.8 -15.5 -.25 -9.4 -11.5 -.25 -9.4 -11.5 -.25 -5.8
  [4,14,-15.5,-.25,-5.8,-15.5,-.25,-9.4,-11.5,-.25,-9.4,-11.5,-.25,-5.8],
// 4 14 -15.5 -.25 1.8 -15.5 -.25 -1.8 -11.5 -.25 -1.8 -11.5 -.25 1.8
  [4,14,-15.5,-.25,1.8,-15.5,-.25,-1.8,-11.5,-.25,-1.8,-11.5,-.25,1.8],
// 4 14 -15.5 -.25 9.4 -15.5 -.25 5.8 -11.5 -.25 5.8 -11.5 -.25 9.4
  [4,14,-15.5,-.25,9.4,-15.5,-.25,5.8,-11.5,-.25,5.8,-11.5,-.25,9.4],
// 4 14 -9 -.25 -5.8 -9 -.25 -9.4 -5 -.25 -9.4 -5 -.25 -5.8
  [4,14,-9,-.25,-5.8,-9,-.25,-9.4,-5,-.25,-9.4,-5,-.25,-5.8],
// 4 14 -9 -.25 1.8 -9 -.25 -1.8 -5 -.25 -1.8 -5 -.25 1.8
  [4,14,-9,-.25,1.8,-9,-.25,-1.8,-5,-.25,-1.8,-5,-.25,1.8],
// 4 14 -9 -.25 9.4 -9 -.25 5.8 -5 -.25 5.8 -5 -.25 9.4
  [4,14,-9,-.25,9.4,-9,-.25,5.8,-5,-.25,5.8,-5,-.25,9.4],
// 4 14 -2.5 -.25 -5.8 -2.5 -.25 -9.4 1.5 -.25 -9.4 1.5 -.25 -5.8
  [4,14,-2.5,-.25,-5.8,-2.5,-.25,-9.4,1.5,-.25,-9.4,1.5,-.25,-5.8],
// 4 14 -2.5 -.25 1.8 -2.5 -.25 -1.8 1.5 -.25 -1.8 1.5 -.25 1.8
  [4,14,-2.5,-.25,1.8,-2.5,-.25,-1.8,1.5,-.25,-1.8,1.5,-.25,1.8],
// 4 14 -2.5 -.25 9.4 -2.5 -.25 5.8 1.5 -.25 5.8 1.5 -.25 9.4
  [4,14,-2.5,-.25,9.4,-2.5,-.25,5.8,1.5,-.25,5.8,1.5,-.25,9.4],
// 4 14 -5 -.25 -9.4 -5 -.25 -13.4 -2.5 -.25 -13.4 -2.5 -.25 -9.4
  [4,14,-5,-.25,-9.4,-5,-.25,-13.4,-2.5,-.25,-13.4,-2.5,-.25,-9.4],
// 4 14 1.5 -.25 -9.4 1.5 -.25 -13.4 4 -.25 -13.4 4 -.25 -9.4
  [4,14,1.5,-.25,-9.4,1.5,-.25,-13.4,4,-.25,-13.4,4,-.25,-9.4],
// 4 14 -11.5 -.25 -1.8 -11.5 -.25 -5.8 -9 -.25 -5.8 -9 -.25 -1.8
  [4,14,-11.5,-.25,-1.8,-11.5,-.25,-5.8,-9,-.25,-5.8,-9,-.25,-1.8],
// 4 14 -5 -.25 -1.8 -5 -.25 -5.8 -2.5 -.25 -5.8 -2.5 -.25 -1.8
  [4,14,-5,-.25,-1.8,-5,-.25,-5.8,-2.5,-.25,-5.8,-2.5,-.25,-1.8],
// 4 14 1.5 -.25 -1.8 1.5 -.25 -5.8 4 -.25 -5.8 4 -.25 -1.8
  [4,14,1.5,-.25,-1.8,1.5,-.25,-5.8,4,-.25,-5.8,4,-.25,-1.8],
// 4 14 -11.5 -.25 5.8 -11.5 -.25 1.8 -9 -.25 1.8 -9 -.25 5.8
  [4,14,-11.5,-.25,5.8,-11.5,-.25,1.8,-9,-.25,1.8,-9,-.25,5.8],
// 4 14 -5 -.25 5.8 -5 -.25 1.8 -2.5 -.25 1.8 -2.5 -.25 5.8
  [4,14,-5,-.25,5.8,-5,-.25,1.8,-2.5,-.25,1.8,-2.5,-.25,5.8],
// 4 14 1.5 -.25 5.8 1.5 -.25 1.8 4 -.25 1.8 4 -.25 5.8
  [4,14,1.5,-.25,5.8,1.5,-.25,1.8,4,-.25,1.8,4,-.25,5.8],
// 4 14 -11.5 -.25 13.4 -11.5 -.25 9.4 -9 -.25 9.4 -9 -.25 13.4
  [4,14,-11.5,-.25,13.4,-11.5,-.25,9.4,-9,-.25,9.4,-9,-.25,13.4],
// 4 14 -5 -.25 13.4 -5 -.25 9.4 -2.5 -.25 9.4 -2.5 -.25 13.4
  [4,14,-5,-.25,13.4,-5,-.25,9.4,-2.5,-.25,9.4,-2.5,-.25,13.4],
// 4 14 1.5 -.25 13.4 1.5 -.25 9.4 4 -.25 9.4 4 -.25 13.4
  [4,14,1.5,-.25,13.4,1.5,-.25,9.4,4,-.25,9.4,4,-.25,13.4],
// 4 14 -11.5 -.25 -9.4 -11.5 -.25 -13.4 -9 -.25 -13.4 -9 -.25 -9.4
  [4,14,-11.5,-.25,-9.4,-11.5,-.25,-13.4,-9,-.25,-13.4,-9,-.25,-9.4],
// 4 14 -19 -.25 -17.5 -17.5 -.25 -19 -15.5 -.25 -13.4 -15.5 -.25 -9.4
  [4,14,-19,-.25,-17.5,-17.5,-.25,-19,-15.5,-.25,-13.4,-15.5,-.25,-9.4],
// 3 14 -19 -.25 -17.5 -15.5 -.25 -9.4 -15.5 -.25 -5.8
  [3,14,-19,-.25,-17.5,-15.5,-.25,-9.4,-15.5,-.25,-5.8],
// 3 14 -19 -.25 -17.5 -15.5 -.25 -5.8 -15.5 -.25 -1.8
  [3,14,-19,-.25,-17.5,-15.5,-.25,-5.8,-15.5,-.25,-1.8],
// 4 14 -19 -.25 -17.5 -15.5 -.25 -1.8 -15.5 -.25 1.8 -19 -.25 17.5
  [4,14,-19,-.25,-17.5,-15.5,-.25,-1.8,-15.5,-.25,1.8,-19,-.25,17.5],
// 3 14 -19 -.25 17.5 -15.5 -.25 1.8 -15.5 -.25 5.8
  [3,14,-19,-.25,17.5,-15.5,-.25,1.8,-15.5,-.25,5.8],
// 3 14 -19 -.25 17.5 -15.5 -.25 5.8 -15.5 -.25 9.4
  [3,14,-19,-.25,17.5,-15.5,-.25,5.8,-15.5,-.25,9.4],
// 4 14 -19 -.25 17.5 -15.5 -.25 9.4 -15.5 -.25 13.4 -17.5 -.25 19
  [4,14,-19,-.25,17.5,-15.5,-.25,9.4,-15.5,-.25,13.4,-17.5,-.25,19],
// 3 14 -17.5 -.25 19 -15.5 -.25 13.4 -11.5 -.25 13.4
  [3,14,-17.5,-.25,19,-15.5,-.25,13.4,-11.5,-.25,13.4],
// 3 14 -17.5 -.25 19 -11.5 -.25 13.4 -9 -.25 13.4
  [3,14,-17.5,-.25,19,-11.5,-.25,13.4,-9,-.25,13.4],
// 3 14 -17.5 -.25 19 -9 -.25 13.4 -5 -.25 13.4
  [3,14,-17.5,-.25,19,-9,-.25,13.4,-5,-.25,13.4],
// 3 14 -17.5 -.25 19 -5 -.25 13.4 -2.5 -.25 13.4
  [3,14,-17.5,-.25,19,-5,-.25,13.4,-2.5,-.25,13.4],
// 4 14 -17.5 -.25 19 -2.5 -.25 13.4 1.5 -.25 13.4 17.5 -.25 19
  [4,14,-17.5,-.25,19,-2.5,-.25,13.4,1.5,-.25,13.4,17.5,-.25,19],
// 3 14 1.5 -.25 13.4 4 -.25 13.4 17.5 -.25 19
  [3,14,1.5,-.25,13.4,4,-.25,13.4,17.5,-.25,19],
// 4 14 17.5 -.25 19 4 -.25 13.4 8 -.25 13.4 12 -.25 13.7
  [4,14,17.5,-.25,19,4,-.25,13.4,8,-.25,13.4,12,-.25,13.7],
// 4 14 8 -.25 -13.4 4 -.25 -13.4 17.5 -.25 -19 12 -.25 -13.7
  [4,14,8,-.25,-13.4,4,-.25,-13.4,17.5,-.25,-19,12,-.25,-13.7],
// 4 14 17.5 -.25 -19 4 -.25 -13.4 1.5 -.25 -13.4 -17.5 -.25 -19
  [4,14,17.5,-.25,-19,4,-.25,-13.4,1.5,-.25,-13.4,-17.5,-.25,-19],
// 3 14 -17.5 -.25 -19 1.5 -.25 -13.4 -2.5 -.25 -13.4
  [3,14,-17.5,-.25,-19,1.5,-.25,-13.4,-2.5,-.25,-13.4],
// 3 14 -17.5 -.25 -19 -2.5 -.25 -13.4 -5 -.25 -13.4
  [3,14,-17.5,-.25,-19,-2.5,-.25,-13.4,-5,-.25,-13.4],
// 3 14 -17.5 -.25 -19 -5 -.25 -13.4 -9 -.25 -13.4
  [3,14,-17.5,-.25,-19,-5,-.25,-13.4,-9,-.25,-13.4],
// 3 14 -17.5 -.25 -19 -9 -.25 -13.4 -11.5 -.25 -13.4
  [3,14,-17.5,-.25,-19,-9,-.25,-13.4,-11.5,-.25,-13.4],
// 3 14 -17.5 -.25 -19 -11.5 -.25 -13.4 -15.5 -.25 -13.4
  [3,14,-17.5,-.25,-19,-11.5,-.25,-13.4,-15.5,-.25,-13.4],
// 3 14 17 -.25 1.2 17 -.25 -1.2 19 -.25 17.5
  [3,14,17,-.25,1.2,17,-.25,-1.2,19,-.25,17.5],
];
module ldraw_lib__6429457f(step=0, col=false, unit=2/5, alt=false, line=0.2, solid=!$preview)
    makepoly(ldraw_lib__6429457f(), step=step, col=col, unit=unit, alt=alt, line=line, solid=solid);
ldraw_lib__6429457f(line=0.2);
